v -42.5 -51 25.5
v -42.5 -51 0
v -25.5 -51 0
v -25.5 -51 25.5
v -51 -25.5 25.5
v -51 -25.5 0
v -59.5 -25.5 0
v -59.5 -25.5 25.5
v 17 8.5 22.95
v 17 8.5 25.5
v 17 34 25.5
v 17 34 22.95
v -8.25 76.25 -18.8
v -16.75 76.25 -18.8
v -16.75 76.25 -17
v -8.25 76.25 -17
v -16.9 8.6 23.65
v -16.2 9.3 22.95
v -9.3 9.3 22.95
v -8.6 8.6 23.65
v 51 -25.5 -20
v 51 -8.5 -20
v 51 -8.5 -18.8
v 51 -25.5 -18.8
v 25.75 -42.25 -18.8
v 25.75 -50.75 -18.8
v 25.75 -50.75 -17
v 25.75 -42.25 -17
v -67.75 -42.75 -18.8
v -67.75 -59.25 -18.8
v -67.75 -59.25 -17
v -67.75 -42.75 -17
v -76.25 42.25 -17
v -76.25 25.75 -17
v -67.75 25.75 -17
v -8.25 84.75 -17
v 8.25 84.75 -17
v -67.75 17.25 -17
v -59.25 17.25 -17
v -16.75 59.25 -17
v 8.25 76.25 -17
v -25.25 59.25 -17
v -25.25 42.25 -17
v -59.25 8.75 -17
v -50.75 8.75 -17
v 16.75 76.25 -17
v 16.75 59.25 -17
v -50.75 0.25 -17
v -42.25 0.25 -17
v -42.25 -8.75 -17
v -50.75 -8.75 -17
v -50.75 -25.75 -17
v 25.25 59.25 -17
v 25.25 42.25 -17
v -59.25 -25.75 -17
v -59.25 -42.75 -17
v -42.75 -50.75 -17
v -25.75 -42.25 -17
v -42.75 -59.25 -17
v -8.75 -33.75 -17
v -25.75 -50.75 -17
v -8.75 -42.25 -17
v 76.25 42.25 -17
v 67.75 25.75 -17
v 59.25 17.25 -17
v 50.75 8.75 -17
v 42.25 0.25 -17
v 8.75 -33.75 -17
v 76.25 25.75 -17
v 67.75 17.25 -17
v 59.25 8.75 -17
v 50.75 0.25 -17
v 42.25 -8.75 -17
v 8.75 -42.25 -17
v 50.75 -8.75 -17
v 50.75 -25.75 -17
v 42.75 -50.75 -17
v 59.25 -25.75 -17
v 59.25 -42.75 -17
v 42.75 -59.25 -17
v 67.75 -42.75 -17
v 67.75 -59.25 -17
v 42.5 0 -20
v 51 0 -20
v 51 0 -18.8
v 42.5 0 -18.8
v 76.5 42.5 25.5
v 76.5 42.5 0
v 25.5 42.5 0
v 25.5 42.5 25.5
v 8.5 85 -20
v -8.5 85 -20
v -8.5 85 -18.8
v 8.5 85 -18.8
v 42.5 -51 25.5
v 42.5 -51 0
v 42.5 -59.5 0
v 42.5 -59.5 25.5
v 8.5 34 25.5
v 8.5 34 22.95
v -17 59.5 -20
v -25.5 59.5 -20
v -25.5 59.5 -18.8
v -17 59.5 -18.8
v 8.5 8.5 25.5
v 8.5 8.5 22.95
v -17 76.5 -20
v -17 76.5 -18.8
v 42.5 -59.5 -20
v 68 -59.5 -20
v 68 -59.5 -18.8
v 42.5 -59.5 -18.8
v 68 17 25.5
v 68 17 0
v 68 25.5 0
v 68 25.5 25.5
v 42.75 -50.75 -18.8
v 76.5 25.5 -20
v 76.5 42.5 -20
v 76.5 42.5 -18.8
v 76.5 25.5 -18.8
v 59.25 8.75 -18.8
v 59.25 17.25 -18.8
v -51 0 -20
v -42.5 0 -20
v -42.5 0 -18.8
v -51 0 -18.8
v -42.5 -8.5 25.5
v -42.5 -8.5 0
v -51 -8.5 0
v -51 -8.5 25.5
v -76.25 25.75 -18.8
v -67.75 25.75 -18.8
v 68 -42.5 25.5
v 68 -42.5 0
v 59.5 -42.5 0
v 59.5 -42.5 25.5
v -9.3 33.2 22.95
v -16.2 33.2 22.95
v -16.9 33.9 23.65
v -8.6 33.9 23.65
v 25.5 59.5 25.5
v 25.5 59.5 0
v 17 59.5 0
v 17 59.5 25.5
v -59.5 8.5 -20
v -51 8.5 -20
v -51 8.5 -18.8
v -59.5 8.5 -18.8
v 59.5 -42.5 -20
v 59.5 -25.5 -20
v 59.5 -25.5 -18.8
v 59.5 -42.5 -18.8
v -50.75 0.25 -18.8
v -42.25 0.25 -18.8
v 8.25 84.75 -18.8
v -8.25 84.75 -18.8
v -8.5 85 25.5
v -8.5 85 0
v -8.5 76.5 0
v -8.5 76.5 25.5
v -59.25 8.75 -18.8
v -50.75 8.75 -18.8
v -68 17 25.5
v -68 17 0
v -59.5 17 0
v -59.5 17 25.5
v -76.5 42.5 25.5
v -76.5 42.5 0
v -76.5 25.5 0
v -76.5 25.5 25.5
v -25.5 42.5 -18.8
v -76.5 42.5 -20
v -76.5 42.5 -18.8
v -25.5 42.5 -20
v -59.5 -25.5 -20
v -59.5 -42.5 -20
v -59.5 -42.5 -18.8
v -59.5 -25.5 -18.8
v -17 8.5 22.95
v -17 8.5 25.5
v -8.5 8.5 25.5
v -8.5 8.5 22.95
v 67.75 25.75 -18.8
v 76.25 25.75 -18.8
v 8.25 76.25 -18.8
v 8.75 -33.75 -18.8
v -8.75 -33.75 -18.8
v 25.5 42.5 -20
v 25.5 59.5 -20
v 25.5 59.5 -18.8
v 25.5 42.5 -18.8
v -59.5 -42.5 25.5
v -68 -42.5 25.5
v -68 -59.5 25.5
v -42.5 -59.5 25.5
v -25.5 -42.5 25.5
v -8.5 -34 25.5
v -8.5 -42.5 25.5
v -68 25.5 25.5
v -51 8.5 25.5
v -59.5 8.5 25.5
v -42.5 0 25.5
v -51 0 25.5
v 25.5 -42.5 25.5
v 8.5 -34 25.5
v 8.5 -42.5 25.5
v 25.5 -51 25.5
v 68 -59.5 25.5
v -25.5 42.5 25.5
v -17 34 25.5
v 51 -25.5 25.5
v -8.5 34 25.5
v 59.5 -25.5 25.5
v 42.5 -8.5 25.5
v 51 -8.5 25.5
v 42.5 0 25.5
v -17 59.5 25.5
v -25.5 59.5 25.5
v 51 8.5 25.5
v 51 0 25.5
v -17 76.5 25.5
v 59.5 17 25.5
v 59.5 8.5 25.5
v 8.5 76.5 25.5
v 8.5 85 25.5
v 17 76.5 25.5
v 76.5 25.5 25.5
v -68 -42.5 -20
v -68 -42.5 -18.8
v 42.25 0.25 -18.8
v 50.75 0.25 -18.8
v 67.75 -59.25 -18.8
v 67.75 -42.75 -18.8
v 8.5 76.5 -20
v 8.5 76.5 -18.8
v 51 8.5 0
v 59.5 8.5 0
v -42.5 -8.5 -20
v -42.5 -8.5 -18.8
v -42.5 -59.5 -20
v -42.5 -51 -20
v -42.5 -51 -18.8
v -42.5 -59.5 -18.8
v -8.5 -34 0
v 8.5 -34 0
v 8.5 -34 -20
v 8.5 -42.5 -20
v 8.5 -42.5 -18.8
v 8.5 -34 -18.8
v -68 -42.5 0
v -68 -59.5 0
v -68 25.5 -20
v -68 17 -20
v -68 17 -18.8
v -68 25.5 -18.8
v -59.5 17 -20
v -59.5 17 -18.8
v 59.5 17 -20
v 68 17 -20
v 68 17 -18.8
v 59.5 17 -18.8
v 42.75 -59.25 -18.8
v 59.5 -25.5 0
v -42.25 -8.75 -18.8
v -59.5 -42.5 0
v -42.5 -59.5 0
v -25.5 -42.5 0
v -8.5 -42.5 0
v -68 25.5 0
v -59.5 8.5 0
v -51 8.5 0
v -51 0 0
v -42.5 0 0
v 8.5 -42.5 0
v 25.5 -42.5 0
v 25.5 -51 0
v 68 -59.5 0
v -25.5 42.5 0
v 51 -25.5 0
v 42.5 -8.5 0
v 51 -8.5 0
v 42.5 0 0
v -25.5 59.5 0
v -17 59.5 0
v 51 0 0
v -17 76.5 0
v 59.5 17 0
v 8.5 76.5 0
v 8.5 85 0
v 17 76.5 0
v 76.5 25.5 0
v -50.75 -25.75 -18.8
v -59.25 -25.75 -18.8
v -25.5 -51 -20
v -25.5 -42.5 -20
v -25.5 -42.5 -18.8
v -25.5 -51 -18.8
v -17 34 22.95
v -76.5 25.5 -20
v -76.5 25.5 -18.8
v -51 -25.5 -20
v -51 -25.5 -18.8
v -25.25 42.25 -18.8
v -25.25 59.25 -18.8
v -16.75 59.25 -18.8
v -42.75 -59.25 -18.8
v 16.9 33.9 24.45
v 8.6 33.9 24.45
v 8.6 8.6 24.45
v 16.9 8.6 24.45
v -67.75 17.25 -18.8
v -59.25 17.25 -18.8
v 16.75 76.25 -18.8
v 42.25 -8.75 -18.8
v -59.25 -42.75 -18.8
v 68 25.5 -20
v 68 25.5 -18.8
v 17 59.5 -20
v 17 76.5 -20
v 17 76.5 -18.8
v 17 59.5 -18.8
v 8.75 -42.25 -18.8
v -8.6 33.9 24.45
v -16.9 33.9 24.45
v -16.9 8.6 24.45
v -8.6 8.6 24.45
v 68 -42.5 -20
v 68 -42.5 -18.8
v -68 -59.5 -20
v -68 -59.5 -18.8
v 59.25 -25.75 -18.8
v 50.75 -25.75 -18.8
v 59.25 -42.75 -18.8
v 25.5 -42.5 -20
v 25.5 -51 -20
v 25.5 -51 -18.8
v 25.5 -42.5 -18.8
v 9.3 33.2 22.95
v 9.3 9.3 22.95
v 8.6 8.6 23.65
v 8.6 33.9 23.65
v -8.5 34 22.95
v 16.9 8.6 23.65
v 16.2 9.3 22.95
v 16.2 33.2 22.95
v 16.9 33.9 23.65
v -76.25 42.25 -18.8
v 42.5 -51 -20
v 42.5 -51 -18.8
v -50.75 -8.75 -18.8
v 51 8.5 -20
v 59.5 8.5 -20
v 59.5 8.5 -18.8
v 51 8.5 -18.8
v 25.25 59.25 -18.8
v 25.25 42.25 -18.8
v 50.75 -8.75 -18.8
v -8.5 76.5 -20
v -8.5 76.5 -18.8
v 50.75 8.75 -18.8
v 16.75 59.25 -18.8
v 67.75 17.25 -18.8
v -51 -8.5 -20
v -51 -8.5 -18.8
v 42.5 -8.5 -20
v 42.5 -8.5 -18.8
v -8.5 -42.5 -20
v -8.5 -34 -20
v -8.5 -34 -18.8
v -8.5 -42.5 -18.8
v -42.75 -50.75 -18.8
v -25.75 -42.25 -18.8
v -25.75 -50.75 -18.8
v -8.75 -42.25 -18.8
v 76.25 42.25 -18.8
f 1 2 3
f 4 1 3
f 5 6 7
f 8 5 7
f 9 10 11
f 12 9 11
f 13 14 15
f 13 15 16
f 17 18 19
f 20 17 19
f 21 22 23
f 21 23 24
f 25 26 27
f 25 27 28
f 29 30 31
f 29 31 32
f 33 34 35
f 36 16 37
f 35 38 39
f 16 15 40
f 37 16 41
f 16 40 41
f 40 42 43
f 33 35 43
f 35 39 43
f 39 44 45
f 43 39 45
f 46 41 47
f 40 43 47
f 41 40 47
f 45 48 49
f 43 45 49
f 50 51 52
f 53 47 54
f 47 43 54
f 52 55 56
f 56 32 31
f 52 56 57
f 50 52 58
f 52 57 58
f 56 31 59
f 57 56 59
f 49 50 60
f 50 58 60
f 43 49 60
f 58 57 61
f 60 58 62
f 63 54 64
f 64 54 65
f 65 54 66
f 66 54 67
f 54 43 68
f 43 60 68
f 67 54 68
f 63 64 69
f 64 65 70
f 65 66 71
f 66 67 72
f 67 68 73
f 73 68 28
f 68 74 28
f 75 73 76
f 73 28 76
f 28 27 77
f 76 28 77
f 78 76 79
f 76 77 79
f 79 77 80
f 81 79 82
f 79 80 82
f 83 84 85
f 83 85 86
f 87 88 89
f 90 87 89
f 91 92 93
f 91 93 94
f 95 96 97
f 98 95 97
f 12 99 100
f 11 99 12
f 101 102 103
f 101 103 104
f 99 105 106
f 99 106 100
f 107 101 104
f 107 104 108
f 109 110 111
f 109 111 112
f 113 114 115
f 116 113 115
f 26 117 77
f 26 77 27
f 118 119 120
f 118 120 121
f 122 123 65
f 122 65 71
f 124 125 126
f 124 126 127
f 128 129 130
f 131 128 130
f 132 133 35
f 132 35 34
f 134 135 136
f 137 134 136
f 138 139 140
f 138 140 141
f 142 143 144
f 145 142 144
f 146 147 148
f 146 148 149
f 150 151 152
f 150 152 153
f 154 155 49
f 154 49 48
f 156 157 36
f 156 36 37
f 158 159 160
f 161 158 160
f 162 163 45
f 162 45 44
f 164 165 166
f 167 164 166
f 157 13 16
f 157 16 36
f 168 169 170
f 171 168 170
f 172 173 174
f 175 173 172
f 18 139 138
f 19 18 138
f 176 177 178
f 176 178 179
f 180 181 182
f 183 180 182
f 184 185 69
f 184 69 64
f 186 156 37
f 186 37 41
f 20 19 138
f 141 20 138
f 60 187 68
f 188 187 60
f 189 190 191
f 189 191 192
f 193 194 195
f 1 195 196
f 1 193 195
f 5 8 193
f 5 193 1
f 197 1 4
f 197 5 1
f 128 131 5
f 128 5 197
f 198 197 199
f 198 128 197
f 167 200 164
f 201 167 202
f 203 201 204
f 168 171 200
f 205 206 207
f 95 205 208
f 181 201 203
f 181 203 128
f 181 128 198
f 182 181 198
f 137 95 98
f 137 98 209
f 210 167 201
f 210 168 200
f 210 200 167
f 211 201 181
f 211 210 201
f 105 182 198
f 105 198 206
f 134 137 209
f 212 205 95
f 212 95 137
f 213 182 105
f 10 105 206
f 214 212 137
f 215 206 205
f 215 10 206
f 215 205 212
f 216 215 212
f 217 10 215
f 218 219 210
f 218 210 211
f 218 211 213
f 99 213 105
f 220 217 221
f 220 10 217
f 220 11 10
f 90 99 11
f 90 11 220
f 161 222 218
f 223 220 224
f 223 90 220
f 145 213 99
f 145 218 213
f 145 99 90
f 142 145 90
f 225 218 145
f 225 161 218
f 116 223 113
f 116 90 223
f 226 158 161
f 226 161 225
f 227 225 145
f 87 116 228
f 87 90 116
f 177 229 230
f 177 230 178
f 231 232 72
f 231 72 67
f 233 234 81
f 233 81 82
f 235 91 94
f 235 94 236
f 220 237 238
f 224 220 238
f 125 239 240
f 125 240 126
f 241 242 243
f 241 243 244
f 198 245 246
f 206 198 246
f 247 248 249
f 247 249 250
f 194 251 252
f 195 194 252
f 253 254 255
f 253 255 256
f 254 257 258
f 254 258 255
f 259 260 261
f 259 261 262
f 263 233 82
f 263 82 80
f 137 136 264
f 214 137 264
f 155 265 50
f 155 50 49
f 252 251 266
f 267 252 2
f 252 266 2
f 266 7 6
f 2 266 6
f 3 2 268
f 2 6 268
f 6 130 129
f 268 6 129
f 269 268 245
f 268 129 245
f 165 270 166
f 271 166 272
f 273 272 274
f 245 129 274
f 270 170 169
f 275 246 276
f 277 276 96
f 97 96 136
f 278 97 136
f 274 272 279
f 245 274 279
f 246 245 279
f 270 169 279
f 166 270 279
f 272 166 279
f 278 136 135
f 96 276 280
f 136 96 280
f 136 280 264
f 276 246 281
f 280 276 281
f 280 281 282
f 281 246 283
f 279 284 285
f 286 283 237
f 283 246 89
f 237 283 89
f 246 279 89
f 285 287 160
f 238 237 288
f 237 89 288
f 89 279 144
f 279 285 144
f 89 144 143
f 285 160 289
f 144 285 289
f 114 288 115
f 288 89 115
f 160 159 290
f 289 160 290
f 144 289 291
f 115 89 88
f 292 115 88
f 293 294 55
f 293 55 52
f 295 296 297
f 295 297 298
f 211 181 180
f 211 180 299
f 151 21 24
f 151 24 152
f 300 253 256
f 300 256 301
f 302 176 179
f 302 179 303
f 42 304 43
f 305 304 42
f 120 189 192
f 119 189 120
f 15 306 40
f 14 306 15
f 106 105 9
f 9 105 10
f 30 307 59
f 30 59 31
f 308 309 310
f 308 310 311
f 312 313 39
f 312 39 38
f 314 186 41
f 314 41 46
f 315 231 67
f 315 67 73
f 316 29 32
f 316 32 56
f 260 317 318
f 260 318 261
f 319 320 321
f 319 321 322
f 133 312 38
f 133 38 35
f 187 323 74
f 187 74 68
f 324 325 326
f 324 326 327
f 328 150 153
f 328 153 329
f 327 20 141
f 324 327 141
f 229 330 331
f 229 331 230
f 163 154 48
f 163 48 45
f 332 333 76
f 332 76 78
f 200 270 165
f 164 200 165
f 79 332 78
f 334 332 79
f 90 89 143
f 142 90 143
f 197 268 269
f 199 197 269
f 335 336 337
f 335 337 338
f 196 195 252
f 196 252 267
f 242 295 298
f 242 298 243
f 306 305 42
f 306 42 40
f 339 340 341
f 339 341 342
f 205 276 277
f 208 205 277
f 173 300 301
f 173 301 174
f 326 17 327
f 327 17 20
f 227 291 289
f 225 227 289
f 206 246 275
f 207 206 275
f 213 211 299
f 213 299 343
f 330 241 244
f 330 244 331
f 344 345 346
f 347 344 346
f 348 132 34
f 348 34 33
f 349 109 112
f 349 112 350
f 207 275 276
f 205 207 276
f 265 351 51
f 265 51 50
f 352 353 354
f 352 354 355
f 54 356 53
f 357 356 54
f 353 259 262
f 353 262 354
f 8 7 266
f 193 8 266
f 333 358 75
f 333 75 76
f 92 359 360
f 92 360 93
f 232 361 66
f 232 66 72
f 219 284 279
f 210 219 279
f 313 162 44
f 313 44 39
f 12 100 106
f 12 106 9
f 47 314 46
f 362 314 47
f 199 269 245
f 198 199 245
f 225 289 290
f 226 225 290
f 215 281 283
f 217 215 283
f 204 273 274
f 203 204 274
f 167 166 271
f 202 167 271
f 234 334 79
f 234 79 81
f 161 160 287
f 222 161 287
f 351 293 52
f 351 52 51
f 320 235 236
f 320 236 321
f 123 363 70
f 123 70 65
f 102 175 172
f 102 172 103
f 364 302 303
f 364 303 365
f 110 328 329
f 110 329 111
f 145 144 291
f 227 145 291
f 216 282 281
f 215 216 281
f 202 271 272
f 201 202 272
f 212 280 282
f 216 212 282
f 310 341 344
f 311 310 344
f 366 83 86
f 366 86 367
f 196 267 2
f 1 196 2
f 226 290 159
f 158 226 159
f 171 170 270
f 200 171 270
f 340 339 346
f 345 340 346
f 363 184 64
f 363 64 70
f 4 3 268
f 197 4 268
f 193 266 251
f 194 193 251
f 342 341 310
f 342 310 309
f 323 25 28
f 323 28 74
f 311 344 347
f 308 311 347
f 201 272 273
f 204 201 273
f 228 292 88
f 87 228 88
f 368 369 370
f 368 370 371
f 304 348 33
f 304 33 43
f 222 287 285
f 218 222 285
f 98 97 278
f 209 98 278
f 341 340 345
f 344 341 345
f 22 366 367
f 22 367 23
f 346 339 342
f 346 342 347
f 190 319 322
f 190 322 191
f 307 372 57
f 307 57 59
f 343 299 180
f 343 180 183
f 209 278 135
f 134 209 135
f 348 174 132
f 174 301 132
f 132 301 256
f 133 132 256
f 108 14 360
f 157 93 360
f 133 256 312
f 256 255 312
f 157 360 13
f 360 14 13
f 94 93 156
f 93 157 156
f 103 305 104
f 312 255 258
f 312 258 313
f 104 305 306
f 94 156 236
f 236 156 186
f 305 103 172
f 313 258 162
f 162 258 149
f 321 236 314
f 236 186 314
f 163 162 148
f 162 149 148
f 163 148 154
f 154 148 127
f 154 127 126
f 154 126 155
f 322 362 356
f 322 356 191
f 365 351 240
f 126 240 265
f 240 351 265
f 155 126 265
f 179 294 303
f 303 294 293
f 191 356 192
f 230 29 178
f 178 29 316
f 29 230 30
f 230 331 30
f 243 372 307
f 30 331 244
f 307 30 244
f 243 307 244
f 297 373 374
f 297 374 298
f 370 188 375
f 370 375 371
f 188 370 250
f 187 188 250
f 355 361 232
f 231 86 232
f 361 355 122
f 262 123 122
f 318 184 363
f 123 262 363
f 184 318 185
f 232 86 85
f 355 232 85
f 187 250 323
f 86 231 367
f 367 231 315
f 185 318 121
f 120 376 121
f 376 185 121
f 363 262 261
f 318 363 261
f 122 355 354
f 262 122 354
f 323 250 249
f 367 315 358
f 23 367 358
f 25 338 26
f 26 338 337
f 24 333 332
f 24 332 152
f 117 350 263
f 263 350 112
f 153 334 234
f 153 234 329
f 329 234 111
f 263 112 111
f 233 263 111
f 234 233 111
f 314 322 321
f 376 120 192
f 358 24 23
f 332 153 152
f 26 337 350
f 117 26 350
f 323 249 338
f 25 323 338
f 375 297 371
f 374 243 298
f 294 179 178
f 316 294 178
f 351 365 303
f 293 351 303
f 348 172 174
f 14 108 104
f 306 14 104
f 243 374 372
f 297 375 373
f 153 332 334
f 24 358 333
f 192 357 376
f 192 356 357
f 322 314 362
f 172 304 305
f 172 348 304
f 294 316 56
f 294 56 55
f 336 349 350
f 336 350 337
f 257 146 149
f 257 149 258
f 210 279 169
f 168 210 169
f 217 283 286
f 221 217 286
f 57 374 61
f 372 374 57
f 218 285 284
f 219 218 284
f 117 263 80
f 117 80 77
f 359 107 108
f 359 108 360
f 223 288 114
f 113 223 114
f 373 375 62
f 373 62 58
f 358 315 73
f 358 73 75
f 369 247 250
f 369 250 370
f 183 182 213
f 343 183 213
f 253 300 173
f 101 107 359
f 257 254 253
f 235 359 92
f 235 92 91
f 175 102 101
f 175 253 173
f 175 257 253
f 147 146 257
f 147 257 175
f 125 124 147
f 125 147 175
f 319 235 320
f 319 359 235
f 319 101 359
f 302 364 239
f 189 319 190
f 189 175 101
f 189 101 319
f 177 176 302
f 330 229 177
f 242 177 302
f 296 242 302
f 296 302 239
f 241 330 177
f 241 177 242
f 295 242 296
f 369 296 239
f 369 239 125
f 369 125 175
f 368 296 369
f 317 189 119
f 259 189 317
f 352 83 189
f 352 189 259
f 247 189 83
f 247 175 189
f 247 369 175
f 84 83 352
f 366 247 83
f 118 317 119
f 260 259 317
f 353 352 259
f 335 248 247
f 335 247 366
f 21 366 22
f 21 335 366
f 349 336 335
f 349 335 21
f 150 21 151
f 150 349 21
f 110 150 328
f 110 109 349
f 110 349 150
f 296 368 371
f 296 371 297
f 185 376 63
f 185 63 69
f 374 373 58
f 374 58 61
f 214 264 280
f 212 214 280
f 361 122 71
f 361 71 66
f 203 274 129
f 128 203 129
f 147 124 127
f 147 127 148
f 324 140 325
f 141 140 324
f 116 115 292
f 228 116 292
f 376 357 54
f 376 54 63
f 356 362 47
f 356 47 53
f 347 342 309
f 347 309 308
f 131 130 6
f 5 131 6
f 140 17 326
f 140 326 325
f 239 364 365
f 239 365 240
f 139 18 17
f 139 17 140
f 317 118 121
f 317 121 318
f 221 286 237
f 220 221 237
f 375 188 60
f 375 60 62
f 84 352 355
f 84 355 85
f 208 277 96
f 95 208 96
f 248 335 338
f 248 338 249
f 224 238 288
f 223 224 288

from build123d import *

# Parameters (mm, degrees)
F2_DEPTH  = 25.5
F3_W      = 8.5
F3_H      = 25.5
F4_DEPTH  = 2.55
F6_W      = 8.3
F6_H      = 25.3
F7_DEPTH  = 1.5
F8_SIZE   = 0.7
F8_2_SIZE = 0.7
F11_DEPTH = 3
F12_DEPTH = 1.2


with BuildPart() as f2:
    # F1 (on Top) → F2 (new body)
    with BuildSketch(Plane.XY):
        Polygon((8.5, 85), (0, 85), (-8.5, 85), (-8.5, 76.5), (-17, 76.5), (-17, 59.5), (-25.5, 59.5), (-25.5, 42.5), (-76.5, 42.5), (-76.5, 25.5), (-68, 25.5), (-68, 17), (-59.5, 17), (-59.5, 8.5), (-51, 8.5), (-51, 0), (-42.5, 0), (-42.5, -8.5), (-51, -8.5), (-51, -25.5), (-59.5, -25.5), (-59.5, -42.5), (-68, -42.5), (-68, -59.5), (-42.5, -59.5), (-42.5, -51), (-25.5, -51), (-25.5, -42.5), (-8.5, -42.5), (-8.5, -34), (0, -34), (8.5, -34), (8.5, -42.5), (25.5, -42.5), (25.5, -51), (42.5, -51), (42.5, -59.5), (68, -59.5), (68, -42.5), (59.5, -42.5), (59.5, -25.5), (51, -25.5), (51, -8.5), (42.5, -8.5), (42.5, 0), (51, 0), (51, 8.5), (59.5, 8.5), (59.5, 17), (68, 17), (68, 25.5), (76.5, 25.5), (76.5, 42.5), (25.5, 42.5), (25.5, 59.5), (17, 59.5), (17, 76.5), (8.5, 76.5), align=None)
    extrude(amount=F2_DEPTH)

    # F3 (on face) → F4 (cut)
    with BuildSketch(Plane.XY.offset(25.5)):
        with Locations((-12.75, 21.25)):
            Rectangle(F3_W, F3_H)
        with Locations((12.75, 21.25)):
            Rectangle(F3_W, F3_H)
    extrude(amount=-F4_DEPTH, mode=Mode.SUBTRACT)


with BuildPart() as f7:
    # F6 (on face) → F7 (new body)
    with BuildSketch(Plane.XY.offset(22.95)):
        with Locations((-12.75, 21.25)):
            Rectangle(F6_W, F6_H)
    extrude(amount=F7_DEPTH)

    # F8
    f8_edges = [f7.edges().sort_by_distance(p)[0] for p in [
        (-8.6, 21.25, 22.95),
        (-12.75, 33.9, 22.95),
        (-16.9, 21.25, 22.95),
        (-12.75, 8.6, 22.95),
    ]]
    chamfer(f8_edges, length=F8_SIZE)


with BuildPart() as f7b:
    # F6 (on face) → F7, piece 2 (new body)
    with BuildSketch(Plane.XY.offset(22.95)):
        with Locations((12.75, 21.25)):
            Rectangle(F6_W, F6_H)
    extrude(amount=F7_DEPTH)

    # F8#2
    f8_2_edges = [f7b.edges().sort_by_distance(p)[0] for p in [
        (16.9, 21.25, 22.95),
        (12.75, 33.9, 22.95),
        (8.6, 21.25, 22.95),
        (12.75, 8.6, 22.95),
    ]]
    chamfer(f8_2_edges, length=F8_2_SIZE)


with BuildPart() as f11:
    # F10 (on offset) → F11 (new body)
    with BuildSketch(Plane(origin=(0, 0, -20), x_dir=(1, 0, 0), z_dir=(0, 0, -1))):
        Polygon((-42.75, 50.75), (-42.75, 59.25), (-67.75, 59.25), (-67.75, 42.75), (-59.25, 42.75), (-59.25, 25.75), (-50.75, 25.75), (-50.75, 8.75), (-42.25, 8.75), (-42.25, -0.25), (-50.75, -0.25), (-50.75, -8.75), (-59.25, -8.75), (-59.25, -17.25), (-67.75, -17.25), (-67.75, -25.75), (-76.25, -25.75), (-76.25, -42.25), (-25.25, -42.25), (-25.25, -59.25), (-16.75, -59.25), (-16.75, -76.25), (-8.25, -76.25), (-8.25, -84.75), (8.25, -84.75), (8.25, -76.25), (16.75, -76.25), (16.75, -59.25), (25.25, -59.25), (25.25, -42.25), (76.25, -42.25), (76.25, -25.75), (67.75, -25.75), (67.75, -17.25), (59.25, -17.25), (59.25, -8.75), (50.75, -8.75), (50.75, -0.25), (42.25, -0.25), (42.25, 8.75), (50.75, 8.75), (50.75, 25.75), (59.25, 25.75), (59.25, 42.75), (67.75, 42.75), (67.75, 59.25), (42.75, 59.25), (42.75, 50.75), (25.75, 50.75), (25.75, 42.25), (8.75, 42.25), (8.75, 33.75), (-8.75, 33.75), (-8.75, 42.25), (-25.75, 42.25), (-25.75, 50.75), align=None)
    extrude(amount=-F11_DEPTH)

    # F10 (on offset) → F12 (join)
    with BuildSketch(Plane(origin=(0, 0, -20), x_dir=(1, 0, 0), z_dir=(0, 0, -1))):
        Polygon((-8.5, -76.5), (-8.5, -85), (8.5, -85), (8.5, -76.5), (17, -76.5), (17, -59.5), (25.5, -59.5), (25.5, -42.5), (76.5, -42.5), (76.5, -25.5), (68, -25.5), (68, -17), (59.5, -17), (59.5, -8.5), (51, -8.5), (51, 0), (42.5, 0), (42.5, 8.5), (51, 8.5), (51, 25.5), (59.5, 25.5), (59.5, 42.5), (68, 42.5), (68, 59.5), (42.5, 59.5), (42.5, 51), (25.5, 51), (25.5, 42.5), (8.5, 42.5), (8.5, 34), (-8.5, 34), (-8.5, 42.5), (-25.5, 42.5), (-25.5, 51), (-42.5, 51), (-42.5, 59.5), (-68, 59.5), (-68, 42.5), (-59.5, 42.5), (-59.5, 25.5), (-51, 25.5), (-51, 8.5), (-42.5, 8.5), (-42.5, 0), (-51, 0), (-51, -8.5), (-59.5, -8.5), (-59.5, -17), (-68, -17), (-68, -25.5), (-76.5, -25.5), (-76.5, -42.5), (-25.5, -42.5), (-25.5, -59.5), (-17, -59.5), (-17, -76.5), align=None)
        Polygon((-67.75, 59.25), (-42.75, 59.25), (-42.75, 50.75), (-25.75, 50.75), (-25.75, 42.25), (-8.75, 42.25), (-8.75, 33.75), (8.75, 33.75), (8.75, 42.25), (25.75, 42.25), (25.75, 50.75), (42.75, 50.75), (42.75, 59.25), (67.75, 59.25), (67.75, 42.75), (59.25, 42.75), (59.25, 25.75), (50.75, 25.75), (50.75, 8.75), (42.25, 8.75), (42.25, -0.25), (50.75, -0.25), (50.75, -8.75), (59.25, -8.75), (59.25, -17.25), (67.75, -17.25), (67.75, -25.75), (76.25, -25.75), (76.25, -42.25), (25.25, -42.25), (25.25, -59.25), (16.75, -59.25), (16.75, -76.25), (8.25, -76.25), (8.25, -84.75), (-8.25, -84.75), (-8.25, -76.25), (-16.75, -76.25), (-16.75, -59.25), (-25.25, -59.25), (-25.25, -42.25), (-76.25, -42.25), (-76.25, -25.75), (-67.75, -25.75), (-67.75, -17.25), (-59.25, -17.25), (-59.25, -8.75), (-50.75, -8.75), (-50.75, -0.25), (-42.25, -0.25), (-42.25, 8.75), (-50.75, 8.75), (-50.75, 25.75), (-59.25, 25.75), (-59.25, 42.75), (-67.75, 42.75), align=None, mode=Mode.SUBTRACT)
    extrude(amount=-F12_DEPTH)


solid = Compound([f2.part, f7.part, f7b.part, f11.part])
